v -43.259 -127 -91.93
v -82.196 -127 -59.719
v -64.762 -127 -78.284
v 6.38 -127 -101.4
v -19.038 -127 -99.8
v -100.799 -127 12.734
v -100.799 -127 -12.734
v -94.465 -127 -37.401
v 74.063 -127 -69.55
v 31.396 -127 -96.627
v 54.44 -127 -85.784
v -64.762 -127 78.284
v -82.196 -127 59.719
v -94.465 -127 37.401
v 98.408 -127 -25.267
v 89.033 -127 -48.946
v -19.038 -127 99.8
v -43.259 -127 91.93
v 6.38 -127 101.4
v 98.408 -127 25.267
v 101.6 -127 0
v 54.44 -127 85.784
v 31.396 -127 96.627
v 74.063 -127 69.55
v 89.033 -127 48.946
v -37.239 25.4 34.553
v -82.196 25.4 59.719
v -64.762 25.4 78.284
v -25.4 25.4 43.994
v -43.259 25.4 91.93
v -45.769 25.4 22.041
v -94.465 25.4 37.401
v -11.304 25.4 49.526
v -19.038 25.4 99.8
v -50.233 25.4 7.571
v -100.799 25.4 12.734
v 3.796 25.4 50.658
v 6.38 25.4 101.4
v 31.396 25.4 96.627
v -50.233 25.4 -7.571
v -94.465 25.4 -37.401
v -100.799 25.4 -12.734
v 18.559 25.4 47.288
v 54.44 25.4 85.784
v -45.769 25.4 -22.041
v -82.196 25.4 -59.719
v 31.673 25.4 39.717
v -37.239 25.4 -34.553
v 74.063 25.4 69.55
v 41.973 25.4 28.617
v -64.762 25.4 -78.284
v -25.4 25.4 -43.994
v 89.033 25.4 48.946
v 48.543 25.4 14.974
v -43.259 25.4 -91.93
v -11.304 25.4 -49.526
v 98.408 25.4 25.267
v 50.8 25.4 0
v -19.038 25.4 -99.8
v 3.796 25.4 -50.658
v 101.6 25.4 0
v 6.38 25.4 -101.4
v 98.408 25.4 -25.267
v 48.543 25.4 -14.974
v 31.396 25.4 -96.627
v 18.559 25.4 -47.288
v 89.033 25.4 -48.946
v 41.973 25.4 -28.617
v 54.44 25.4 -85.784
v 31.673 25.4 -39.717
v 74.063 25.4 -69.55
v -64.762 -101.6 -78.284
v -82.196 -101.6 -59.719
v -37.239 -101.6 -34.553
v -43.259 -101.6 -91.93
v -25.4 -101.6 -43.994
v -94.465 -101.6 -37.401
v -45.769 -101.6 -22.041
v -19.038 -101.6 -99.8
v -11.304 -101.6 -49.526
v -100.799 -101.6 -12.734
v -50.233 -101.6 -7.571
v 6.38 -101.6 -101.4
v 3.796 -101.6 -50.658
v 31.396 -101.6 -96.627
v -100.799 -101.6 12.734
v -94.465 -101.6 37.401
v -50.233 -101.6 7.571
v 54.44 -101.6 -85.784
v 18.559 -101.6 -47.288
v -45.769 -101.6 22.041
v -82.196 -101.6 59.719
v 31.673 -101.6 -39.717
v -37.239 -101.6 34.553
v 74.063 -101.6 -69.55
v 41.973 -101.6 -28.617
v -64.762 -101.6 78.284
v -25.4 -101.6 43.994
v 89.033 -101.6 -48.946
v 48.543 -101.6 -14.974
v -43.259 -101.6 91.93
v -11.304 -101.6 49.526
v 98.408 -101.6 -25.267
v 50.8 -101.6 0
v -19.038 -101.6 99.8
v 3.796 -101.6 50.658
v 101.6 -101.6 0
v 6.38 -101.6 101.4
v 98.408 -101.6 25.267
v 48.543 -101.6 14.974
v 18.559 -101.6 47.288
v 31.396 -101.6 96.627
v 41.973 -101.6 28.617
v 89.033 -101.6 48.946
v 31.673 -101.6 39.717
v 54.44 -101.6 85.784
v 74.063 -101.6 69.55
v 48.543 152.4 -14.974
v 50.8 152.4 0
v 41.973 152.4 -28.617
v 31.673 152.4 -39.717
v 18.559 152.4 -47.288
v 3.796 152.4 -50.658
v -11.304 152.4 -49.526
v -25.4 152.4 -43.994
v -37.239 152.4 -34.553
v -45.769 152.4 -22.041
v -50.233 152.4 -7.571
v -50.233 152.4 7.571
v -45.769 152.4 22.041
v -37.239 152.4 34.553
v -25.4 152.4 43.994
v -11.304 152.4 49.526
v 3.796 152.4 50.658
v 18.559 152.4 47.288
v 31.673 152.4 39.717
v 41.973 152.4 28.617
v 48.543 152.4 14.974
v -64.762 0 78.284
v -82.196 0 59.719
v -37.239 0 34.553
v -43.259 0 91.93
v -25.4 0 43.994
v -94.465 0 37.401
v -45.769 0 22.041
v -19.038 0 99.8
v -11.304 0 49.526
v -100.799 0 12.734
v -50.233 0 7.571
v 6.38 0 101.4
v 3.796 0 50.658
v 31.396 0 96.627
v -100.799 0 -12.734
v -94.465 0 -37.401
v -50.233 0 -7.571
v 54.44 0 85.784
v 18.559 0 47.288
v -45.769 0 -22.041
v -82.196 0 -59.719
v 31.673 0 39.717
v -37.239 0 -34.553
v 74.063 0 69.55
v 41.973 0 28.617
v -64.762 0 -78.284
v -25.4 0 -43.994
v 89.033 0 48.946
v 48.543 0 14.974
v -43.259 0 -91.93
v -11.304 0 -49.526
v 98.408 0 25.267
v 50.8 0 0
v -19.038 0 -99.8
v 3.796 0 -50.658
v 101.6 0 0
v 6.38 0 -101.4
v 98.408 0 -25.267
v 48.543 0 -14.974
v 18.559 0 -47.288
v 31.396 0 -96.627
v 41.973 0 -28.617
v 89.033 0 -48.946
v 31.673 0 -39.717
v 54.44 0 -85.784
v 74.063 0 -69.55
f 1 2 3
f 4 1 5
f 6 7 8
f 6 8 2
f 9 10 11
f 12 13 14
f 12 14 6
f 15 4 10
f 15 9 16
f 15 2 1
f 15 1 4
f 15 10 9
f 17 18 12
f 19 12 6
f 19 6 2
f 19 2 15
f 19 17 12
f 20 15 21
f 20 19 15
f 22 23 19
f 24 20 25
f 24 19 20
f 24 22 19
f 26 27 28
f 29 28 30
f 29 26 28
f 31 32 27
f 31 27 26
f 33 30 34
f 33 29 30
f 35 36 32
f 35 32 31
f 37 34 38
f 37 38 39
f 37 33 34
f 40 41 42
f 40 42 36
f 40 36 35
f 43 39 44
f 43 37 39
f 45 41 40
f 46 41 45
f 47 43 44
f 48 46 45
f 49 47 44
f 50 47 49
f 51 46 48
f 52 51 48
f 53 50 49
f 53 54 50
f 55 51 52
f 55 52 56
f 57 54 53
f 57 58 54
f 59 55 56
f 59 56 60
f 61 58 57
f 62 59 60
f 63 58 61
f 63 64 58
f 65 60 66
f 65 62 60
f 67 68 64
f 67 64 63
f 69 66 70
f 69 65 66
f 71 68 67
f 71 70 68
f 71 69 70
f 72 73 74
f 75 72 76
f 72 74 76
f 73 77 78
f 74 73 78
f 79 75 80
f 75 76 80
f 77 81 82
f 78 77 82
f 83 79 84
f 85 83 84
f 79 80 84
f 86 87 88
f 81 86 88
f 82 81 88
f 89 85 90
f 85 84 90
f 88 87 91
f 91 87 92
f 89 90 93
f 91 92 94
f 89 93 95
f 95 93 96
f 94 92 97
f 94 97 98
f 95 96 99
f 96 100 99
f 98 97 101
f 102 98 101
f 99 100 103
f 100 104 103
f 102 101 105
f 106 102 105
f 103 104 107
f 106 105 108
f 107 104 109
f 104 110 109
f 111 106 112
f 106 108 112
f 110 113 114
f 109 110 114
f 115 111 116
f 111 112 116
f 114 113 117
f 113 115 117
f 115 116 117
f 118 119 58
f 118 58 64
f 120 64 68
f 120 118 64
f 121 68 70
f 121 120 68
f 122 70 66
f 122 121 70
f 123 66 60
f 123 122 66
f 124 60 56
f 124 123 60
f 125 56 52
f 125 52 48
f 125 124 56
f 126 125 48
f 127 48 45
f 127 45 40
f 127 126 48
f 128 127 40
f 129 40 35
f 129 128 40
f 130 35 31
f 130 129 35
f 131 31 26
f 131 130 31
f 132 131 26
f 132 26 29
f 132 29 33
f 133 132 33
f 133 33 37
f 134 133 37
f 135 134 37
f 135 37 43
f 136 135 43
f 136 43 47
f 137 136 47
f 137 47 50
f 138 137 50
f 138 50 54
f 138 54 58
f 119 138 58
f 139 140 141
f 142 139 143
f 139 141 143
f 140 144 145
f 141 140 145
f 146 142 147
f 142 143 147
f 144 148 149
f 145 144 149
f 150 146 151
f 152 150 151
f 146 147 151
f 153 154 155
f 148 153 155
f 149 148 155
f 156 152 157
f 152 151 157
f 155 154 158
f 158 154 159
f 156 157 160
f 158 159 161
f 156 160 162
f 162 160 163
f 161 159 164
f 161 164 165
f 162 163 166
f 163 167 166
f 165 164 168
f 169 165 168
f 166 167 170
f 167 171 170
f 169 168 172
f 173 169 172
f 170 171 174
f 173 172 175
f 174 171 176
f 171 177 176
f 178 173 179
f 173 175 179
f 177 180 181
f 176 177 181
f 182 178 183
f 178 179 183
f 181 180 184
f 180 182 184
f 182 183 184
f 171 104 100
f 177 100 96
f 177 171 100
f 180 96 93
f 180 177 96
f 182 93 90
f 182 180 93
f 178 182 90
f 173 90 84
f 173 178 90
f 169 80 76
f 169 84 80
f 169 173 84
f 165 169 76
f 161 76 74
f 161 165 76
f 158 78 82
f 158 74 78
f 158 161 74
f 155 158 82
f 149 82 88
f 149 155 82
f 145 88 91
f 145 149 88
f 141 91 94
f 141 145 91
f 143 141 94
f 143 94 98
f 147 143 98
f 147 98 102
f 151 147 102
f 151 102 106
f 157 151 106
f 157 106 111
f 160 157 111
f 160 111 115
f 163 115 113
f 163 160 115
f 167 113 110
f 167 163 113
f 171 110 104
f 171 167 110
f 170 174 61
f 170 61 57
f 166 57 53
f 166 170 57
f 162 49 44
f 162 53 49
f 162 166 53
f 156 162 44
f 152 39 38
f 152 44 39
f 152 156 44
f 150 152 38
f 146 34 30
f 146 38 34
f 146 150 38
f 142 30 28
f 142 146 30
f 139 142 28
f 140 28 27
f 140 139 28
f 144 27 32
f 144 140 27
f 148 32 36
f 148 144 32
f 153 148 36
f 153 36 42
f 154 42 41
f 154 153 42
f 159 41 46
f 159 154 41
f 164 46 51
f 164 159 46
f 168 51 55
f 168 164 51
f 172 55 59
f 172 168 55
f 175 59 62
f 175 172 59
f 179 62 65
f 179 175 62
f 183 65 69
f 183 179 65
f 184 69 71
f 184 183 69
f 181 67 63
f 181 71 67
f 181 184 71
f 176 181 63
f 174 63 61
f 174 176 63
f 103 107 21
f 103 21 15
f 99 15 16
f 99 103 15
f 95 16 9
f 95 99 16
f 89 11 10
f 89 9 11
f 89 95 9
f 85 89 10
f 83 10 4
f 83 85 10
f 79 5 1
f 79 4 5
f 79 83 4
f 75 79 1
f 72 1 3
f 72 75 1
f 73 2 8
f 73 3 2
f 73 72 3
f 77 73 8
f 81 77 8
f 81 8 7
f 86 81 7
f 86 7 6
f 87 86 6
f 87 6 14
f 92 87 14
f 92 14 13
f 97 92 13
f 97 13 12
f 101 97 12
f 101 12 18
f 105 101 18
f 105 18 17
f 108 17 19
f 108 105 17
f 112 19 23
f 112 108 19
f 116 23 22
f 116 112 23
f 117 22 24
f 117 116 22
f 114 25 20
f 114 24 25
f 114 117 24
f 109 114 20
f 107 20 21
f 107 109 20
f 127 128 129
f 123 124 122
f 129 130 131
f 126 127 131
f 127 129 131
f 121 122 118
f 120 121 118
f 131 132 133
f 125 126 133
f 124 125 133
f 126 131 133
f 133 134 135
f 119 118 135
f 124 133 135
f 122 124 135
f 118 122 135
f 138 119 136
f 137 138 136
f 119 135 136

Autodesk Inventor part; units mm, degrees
ref_plane "YZ Plane" through (0, 0, 0) normal (1, 0, 0) x (0, 1, 0)
ref_plane "Work Plane4" through (0, 152.4, 0) normal (0, 1, 0) x (1, 0, 0)
ref_plane "Work Plane5" through (0, 152.4, 0) normal (0, 1, 0) x (1, 0, 0)
ref_plane "Work Plane3" through (0, 152.4, 0) normal (0, -1, 0) x (1, 0, 0)
sketch "Sketch6" plane through (0, 152.4, 0) normal (0, -1, 0) x (1, 0, 0)
  circle A0 centre (0, 0) radius 104.5589 projected
  circle A1 centre (0, 0) radius 50.8
  dimension "d15" = 101.6
extrude "Extrusion6" add sketch "Sketch6" along normal blind 254 contours A1
sketch "Sketch7" plane through (0, -101.6, 0) normal (0, -1, 0) x (1, 0, 0)
  circle A0 centre (0, 0) radius 104.5589 projected
  circle A1 centre (0, 0) radius 101.6
  dimension "d18" = 203.2
extrude "Extrusion7" add sketch "Sketch7" along normal blind 25.4 contours A1
ref_plane "Work Plane1" through (0, 0, 0) normal (0, 1, 0) x (1, 0, 0)
sketch "Sketch8" plane through (0, 0, 0) normal (0, 1, 0) x (1, 0, 0)
  circle A0 centre (0, 0) radius 101.6
  dimension "d22" = 203.2
extrude "Extrusion8" add sketch "Sketch8" along normal blind 25.4
ref_plane "Work Plane2" through (75.376, -18.8821, -44.9646) normal (1, 0, 0) x (0, 1, 0)
sketch "Sketch9" plane through (75.376, -18.8821, -44.9646) normal (1, 0, 0) x (0, 1, 0)
  circle A0 centre (-604.603, 44.9646) radius 12.7
  point P0 (18.8821, 44.9646)
  dimension "d25" = 25.4
extrude "Extrusion9" cut sketch "Sketch9" against normal through all
ref_plane "Work Plane6" through (-51.624, -18.8821, -44.9646) normal (1, 0, 0) x (0, 1, 0)
properties part number "CapstanBottom-ver1-1111-2021"
